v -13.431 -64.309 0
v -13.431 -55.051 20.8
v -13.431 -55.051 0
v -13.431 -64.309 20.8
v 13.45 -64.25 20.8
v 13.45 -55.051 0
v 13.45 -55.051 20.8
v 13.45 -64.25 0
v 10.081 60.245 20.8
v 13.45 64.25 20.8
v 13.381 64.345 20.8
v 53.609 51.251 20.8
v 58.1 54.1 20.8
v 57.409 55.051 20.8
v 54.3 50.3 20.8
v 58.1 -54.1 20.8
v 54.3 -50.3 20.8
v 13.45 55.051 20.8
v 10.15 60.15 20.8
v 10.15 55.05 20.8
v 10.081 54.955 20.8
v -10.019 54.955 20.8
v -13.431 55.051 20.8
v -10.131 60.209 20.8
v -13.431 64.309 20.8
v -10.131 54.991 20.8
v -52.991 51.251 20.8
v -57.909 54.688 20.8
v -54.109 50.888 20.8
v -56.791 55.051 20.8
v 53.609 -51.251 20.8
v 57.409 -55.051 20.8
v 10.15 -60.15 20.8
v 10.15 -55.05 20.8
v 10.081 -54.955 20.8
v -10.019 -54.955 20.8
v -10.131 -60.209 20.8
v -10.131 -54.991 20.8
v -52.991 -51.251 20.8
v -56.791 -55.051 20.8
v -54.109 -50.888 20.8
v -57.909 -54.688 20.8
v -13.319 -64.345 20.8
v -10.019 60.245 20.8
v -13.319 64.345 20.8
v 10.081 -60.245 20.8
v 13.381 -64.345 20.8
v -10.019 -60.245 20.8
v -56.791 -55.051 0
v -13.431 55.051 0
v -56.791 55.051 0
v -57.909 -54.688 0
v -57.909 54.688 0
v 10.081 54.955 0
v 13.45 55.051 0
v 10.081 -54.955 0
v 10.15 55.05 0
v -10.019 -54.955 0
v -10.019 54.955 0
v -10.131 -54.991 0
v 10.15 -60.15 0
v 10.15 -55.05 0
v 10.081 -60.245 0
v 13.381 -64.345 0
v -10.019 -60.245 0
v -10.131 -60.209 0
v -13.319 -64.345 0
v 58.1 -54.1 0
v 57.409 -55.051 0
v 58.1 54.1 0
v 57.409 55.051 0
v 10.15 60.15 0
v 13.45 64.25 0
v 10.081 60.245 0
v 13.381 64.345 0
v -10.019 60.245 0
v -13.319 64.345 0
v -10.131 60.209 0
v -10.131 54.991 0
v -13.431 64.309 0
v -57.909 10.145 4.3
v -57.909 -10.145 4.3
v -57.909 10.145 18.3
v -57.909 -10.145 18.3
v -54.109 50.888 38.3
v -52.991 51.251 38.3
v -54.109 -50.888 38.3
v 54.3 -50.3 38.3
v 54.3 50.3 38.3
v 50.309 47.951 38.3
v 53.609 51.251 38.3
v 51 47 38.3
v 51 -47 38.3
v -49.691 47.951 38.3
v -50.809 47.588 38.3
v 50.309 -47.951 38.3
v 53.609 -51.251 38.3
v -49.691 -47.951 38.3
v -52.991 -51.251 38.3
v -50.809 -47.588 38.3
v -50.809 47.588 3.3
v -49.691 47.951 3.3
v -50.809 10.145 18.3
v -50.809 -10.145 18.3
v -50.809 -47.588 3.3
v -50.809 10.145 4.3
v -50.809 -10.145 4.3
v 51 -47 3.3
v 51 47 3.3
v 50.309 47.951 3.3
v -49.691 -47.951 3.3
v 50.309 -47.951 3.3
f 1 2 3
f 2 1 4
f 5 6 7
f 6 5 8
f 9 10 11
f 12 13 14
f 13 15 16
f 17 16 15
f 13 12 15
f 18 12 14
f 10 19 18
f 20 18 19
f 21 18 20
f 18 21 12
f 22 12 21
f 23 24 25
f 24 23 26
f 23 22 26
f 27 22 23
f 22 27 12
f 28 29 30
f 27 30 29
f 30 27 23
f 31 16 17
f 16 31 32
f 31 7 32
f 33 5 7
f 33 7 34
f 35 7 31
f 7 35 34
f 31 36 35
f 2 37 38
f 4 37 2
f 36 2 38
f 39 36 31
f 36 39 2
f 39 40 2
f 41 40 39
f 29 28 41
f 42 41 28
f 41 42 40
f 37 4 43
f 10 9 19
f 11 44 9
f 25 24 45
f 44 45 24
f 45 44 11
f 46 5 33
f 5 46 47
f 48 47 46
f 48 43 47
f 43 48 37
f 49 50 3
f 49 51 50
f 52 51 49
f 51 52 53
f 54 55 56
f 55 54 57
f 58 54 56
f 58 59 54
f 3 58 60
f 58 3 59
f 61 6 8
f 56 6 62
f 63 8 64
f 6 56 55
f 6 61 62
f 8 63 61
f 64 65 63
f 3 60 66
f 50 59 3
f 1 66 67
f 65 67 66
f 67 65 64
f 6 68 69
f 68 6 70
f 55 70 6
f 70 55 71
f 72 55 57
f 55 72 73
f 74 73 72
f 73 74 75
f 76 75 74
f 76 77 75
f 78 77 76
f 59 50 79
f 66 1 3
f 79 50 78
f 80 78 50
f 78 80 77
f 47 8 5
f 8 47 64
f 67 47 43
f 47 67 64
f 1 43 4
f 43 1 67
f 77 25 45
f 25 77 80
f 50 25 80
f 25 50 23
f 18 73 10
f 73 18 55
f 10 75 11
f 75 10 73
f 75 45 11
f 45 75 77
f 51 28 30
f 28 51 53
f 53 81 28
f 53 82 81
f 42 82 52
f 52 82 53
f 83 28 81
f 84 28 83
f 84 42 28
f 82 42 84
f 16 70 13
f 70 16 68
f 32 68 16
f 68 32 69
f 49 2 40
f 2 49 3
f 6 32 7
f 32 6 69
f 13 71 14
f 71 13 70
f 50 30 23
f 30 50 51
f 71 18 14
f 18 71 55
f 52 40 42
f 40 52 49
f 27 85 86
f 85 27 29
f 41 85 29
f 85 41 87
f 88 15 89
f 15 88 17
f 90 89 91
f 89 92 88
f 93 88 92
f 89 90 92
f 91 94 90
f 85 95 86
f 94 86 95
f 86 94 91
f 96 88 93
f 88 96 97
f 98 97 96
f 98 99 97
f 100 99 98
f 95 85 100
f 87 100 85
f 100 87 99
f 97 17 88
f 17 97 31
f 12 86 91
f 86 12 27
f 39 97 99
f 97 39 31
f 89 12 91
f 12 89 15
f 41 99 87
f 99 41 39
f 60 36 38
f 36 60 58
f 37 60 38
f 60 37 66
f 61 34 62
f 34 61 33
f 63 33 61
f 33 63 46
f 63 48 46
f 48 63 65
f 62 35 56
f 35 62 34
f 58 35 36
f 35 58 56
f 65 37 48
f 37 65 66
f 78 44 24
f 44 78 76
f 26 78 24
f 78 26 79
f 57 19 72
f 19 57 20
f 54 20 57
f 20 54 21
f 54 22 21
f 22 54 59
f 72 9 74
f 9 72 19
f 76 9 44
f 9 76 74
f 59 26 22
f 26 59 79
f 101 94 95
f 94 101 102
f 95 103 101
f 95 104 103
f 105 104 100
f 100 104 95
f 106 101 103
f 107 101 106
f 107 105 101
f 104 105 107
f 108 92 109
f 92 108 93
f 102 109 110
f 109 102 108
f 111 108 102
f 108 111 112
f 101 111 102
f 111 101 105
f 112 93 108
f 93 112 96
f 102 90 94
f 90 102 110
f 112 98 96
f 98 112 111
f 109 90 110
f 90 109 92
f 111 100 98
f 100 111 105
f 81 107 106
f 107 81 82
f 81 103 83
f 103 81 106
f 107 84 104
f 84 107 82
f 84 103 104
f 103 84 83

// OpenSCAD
rainbox_size_x = 99;
rainbox_size_y = 93;
rainbox_size_z = 35;
rainbox_thickness_xy = 3.3;
rainbox_thickness_z = 3.3;
rainbox_tie_thickness = 5;
rainbox_tie_length = 20;
rainbox_corner_radius = 1;
rainbox_barrier_height = rainbox_size_z / 2;
rainbox_barrier_tolerance = 0.5;
rainbox_hole_size_y = 20;
rainbox_hole_size_z = 14;
rainbox_hole_margin_z = 1;

INFINITESIMAL = 0.01;
INFINITY = 100;

bottom();

/*
translate(
  [
    rainbox_size_x + 4 * rainbox_thickness_xy + 2 * rainbox_barrier_tolerance + 4 * rainbox_corner_radius,
    0,
    0
  ]
)
top();
*/

module top () {
  difference () {
    union () {
      rounded_box(
        size = [
          rainbox_size_x + 4 * rainbox_thickness_xy + 2 * rainbox_barrier_tolerance,
          rainbox_size_y + 4 * rainbox_thickness_xy + 2 * rainbox_barrier_tolerance,
          rainbox_thickness_z + rainbox_barrier_height
        ],
        radius = rainbox_corner_radius
      );

      for (tie_side = [-1, 1]) {
        translate(
          [
            0,
            tie_side * (1/2 * rainbox_size_y + 3 * rainbox_thickness_xy + 2 * rainbox_corner_radius),
            0
          ]
        )
        rounded_box(
          size = [
            rainbox_tie_length + 2 * rainbox_thickness_xy,
            rainbox_tie_thickness + 2 * rainbox_thickness_xy,
            rainbox_thickness_z + rainbox_barrier_height
          ]
        );
      }
    }

    translate(
      [
        0,
        0,
        rainbox_thickness_z
      ]
    )
    rounded_box(
      size = [
        rainbox_size_x + 2 * rainbox_thickness_xy + rainbox_barrier_tolerance,
        rainbox_size_y + 2 * rainbox_thickness_xy + rainbox_barrier_tolerance,
        rainbox_barrier_height + rainbox_thickness_z
      ],
      radius = rainbox_corner_radius
    );

    for (tie_side = [-1, 1]) {
      translate(
        [
          0,
          tie_side * (1/2 * rainbox_size_y + 2 * rainbox_thickness_xy + 1/2 * rainbox_tie_thickness + 2 * rainbox_corner_radius),
          - INFINITESIMAL
        ]
      )
      rounded_box(
        size = [
          rainbox_tie_length,
          rainbox_tie_thickness,
          rainbox_size_z
        ]
      );
    }
  }
}

module bottom () {
  difference () {
    union () {
      rounded_box(
        size = [
          rainbox_size_x + 4 * rainbox_thickness_xy + 2 * rainbox_barrier_tolerance,
          rainbox_size_y + 4 * rainbox_thickness_xy + 2 * rainbox_barrier_tolerance,
          rainbox_size_z + rainbox_thickness_z - rainbox_barrier_height
        ],
        radius = rainbox_corner_radius
      );

      translate(
        [
          0,
          0,
          rainbox_size_z + rainbox_thickness_z - rainbox_barrier_height
        ]
      )
      rounded_box(
        size = [
          rainbox_size_x + 2 * rainbox_thickness_xy,
          rainbox_size_y + 2 * rainbox_thickness_xy,
          rainbox_barrier_height
        ],
        radius = rainbox_corner_radius
      );

      for (tie_side = [-1, 1]) {
        translate(
          [
            0,
            tie_side * (1/2 * rainbox_size_y + 3 * rainbox_thickness_xy + 2 * rainbox_corner_radius),
            0
          ]
        )
        rounded_box(
          size = [
            rainbox_tie_length + 2 * rainbox_thickness_xy,
            rainbox_tie_thickness + 2 * rainbox_thickness_xy,
            rainbox_size_z + rainbox_thickness_z - rainbox_barrier_height
          ]
        );
      }
    }

    translate(
      [
        0,
        0,
        rainbox_thickness_z
      ]
    )
    rounded_box(
      size = [
        rainbox_size_x,
        rainbox_size_y,
        rainbox_size_z + rainbox_barrier_height
      ],
      radius = rainbox_corner_radius
    );

    for (tie_side = [-1, 1]) {
      translate(
        [
          0,
          tie_side * (1/2 * rainbox_size_y + 2 * rainbox_thickness_xy + 1/2 * rainbox_tie_thickness + 2 * rainbox_corner_radius),
          - INFINITESIMAL
        ]
      )
      rounded_box(
        size = [
          rainbox_tie_length,
          rainbox_tie_thickness,
          rainbox_size_z
        ]
      );
    }

    translate(
      [
        - (1/2 * rainbox_size_x + rainbox_thickness_xy),
        0,
        rainbox_thickness_z + rainbox_hole_margin_z
      ]
    )
    rounded_box(
      size = [
        rainbox_size_x,
        rainbox_hole_size_y,
        rainbox_hole_size_z
      ]
    );
  }
}

module rounded_box (size, radius = 0.1) {
  width = size[0];
  height = size[1];
  depth = size[2];

  translate([(-1/2) * width, (-1/2) * height])
  linear_extrude(height = depth)
  translate([-1/2 * radius, -1/2 * radius])
  hull () {
    translate([0, 0])
    circle(r = radius);

    translate([width + radius, 0])
    circle(r = radius);

    translate([0, height + radius])
    circle(r = radius);

    translate([width + radius, height + radius])
    circle(r = radius);
  }
}
